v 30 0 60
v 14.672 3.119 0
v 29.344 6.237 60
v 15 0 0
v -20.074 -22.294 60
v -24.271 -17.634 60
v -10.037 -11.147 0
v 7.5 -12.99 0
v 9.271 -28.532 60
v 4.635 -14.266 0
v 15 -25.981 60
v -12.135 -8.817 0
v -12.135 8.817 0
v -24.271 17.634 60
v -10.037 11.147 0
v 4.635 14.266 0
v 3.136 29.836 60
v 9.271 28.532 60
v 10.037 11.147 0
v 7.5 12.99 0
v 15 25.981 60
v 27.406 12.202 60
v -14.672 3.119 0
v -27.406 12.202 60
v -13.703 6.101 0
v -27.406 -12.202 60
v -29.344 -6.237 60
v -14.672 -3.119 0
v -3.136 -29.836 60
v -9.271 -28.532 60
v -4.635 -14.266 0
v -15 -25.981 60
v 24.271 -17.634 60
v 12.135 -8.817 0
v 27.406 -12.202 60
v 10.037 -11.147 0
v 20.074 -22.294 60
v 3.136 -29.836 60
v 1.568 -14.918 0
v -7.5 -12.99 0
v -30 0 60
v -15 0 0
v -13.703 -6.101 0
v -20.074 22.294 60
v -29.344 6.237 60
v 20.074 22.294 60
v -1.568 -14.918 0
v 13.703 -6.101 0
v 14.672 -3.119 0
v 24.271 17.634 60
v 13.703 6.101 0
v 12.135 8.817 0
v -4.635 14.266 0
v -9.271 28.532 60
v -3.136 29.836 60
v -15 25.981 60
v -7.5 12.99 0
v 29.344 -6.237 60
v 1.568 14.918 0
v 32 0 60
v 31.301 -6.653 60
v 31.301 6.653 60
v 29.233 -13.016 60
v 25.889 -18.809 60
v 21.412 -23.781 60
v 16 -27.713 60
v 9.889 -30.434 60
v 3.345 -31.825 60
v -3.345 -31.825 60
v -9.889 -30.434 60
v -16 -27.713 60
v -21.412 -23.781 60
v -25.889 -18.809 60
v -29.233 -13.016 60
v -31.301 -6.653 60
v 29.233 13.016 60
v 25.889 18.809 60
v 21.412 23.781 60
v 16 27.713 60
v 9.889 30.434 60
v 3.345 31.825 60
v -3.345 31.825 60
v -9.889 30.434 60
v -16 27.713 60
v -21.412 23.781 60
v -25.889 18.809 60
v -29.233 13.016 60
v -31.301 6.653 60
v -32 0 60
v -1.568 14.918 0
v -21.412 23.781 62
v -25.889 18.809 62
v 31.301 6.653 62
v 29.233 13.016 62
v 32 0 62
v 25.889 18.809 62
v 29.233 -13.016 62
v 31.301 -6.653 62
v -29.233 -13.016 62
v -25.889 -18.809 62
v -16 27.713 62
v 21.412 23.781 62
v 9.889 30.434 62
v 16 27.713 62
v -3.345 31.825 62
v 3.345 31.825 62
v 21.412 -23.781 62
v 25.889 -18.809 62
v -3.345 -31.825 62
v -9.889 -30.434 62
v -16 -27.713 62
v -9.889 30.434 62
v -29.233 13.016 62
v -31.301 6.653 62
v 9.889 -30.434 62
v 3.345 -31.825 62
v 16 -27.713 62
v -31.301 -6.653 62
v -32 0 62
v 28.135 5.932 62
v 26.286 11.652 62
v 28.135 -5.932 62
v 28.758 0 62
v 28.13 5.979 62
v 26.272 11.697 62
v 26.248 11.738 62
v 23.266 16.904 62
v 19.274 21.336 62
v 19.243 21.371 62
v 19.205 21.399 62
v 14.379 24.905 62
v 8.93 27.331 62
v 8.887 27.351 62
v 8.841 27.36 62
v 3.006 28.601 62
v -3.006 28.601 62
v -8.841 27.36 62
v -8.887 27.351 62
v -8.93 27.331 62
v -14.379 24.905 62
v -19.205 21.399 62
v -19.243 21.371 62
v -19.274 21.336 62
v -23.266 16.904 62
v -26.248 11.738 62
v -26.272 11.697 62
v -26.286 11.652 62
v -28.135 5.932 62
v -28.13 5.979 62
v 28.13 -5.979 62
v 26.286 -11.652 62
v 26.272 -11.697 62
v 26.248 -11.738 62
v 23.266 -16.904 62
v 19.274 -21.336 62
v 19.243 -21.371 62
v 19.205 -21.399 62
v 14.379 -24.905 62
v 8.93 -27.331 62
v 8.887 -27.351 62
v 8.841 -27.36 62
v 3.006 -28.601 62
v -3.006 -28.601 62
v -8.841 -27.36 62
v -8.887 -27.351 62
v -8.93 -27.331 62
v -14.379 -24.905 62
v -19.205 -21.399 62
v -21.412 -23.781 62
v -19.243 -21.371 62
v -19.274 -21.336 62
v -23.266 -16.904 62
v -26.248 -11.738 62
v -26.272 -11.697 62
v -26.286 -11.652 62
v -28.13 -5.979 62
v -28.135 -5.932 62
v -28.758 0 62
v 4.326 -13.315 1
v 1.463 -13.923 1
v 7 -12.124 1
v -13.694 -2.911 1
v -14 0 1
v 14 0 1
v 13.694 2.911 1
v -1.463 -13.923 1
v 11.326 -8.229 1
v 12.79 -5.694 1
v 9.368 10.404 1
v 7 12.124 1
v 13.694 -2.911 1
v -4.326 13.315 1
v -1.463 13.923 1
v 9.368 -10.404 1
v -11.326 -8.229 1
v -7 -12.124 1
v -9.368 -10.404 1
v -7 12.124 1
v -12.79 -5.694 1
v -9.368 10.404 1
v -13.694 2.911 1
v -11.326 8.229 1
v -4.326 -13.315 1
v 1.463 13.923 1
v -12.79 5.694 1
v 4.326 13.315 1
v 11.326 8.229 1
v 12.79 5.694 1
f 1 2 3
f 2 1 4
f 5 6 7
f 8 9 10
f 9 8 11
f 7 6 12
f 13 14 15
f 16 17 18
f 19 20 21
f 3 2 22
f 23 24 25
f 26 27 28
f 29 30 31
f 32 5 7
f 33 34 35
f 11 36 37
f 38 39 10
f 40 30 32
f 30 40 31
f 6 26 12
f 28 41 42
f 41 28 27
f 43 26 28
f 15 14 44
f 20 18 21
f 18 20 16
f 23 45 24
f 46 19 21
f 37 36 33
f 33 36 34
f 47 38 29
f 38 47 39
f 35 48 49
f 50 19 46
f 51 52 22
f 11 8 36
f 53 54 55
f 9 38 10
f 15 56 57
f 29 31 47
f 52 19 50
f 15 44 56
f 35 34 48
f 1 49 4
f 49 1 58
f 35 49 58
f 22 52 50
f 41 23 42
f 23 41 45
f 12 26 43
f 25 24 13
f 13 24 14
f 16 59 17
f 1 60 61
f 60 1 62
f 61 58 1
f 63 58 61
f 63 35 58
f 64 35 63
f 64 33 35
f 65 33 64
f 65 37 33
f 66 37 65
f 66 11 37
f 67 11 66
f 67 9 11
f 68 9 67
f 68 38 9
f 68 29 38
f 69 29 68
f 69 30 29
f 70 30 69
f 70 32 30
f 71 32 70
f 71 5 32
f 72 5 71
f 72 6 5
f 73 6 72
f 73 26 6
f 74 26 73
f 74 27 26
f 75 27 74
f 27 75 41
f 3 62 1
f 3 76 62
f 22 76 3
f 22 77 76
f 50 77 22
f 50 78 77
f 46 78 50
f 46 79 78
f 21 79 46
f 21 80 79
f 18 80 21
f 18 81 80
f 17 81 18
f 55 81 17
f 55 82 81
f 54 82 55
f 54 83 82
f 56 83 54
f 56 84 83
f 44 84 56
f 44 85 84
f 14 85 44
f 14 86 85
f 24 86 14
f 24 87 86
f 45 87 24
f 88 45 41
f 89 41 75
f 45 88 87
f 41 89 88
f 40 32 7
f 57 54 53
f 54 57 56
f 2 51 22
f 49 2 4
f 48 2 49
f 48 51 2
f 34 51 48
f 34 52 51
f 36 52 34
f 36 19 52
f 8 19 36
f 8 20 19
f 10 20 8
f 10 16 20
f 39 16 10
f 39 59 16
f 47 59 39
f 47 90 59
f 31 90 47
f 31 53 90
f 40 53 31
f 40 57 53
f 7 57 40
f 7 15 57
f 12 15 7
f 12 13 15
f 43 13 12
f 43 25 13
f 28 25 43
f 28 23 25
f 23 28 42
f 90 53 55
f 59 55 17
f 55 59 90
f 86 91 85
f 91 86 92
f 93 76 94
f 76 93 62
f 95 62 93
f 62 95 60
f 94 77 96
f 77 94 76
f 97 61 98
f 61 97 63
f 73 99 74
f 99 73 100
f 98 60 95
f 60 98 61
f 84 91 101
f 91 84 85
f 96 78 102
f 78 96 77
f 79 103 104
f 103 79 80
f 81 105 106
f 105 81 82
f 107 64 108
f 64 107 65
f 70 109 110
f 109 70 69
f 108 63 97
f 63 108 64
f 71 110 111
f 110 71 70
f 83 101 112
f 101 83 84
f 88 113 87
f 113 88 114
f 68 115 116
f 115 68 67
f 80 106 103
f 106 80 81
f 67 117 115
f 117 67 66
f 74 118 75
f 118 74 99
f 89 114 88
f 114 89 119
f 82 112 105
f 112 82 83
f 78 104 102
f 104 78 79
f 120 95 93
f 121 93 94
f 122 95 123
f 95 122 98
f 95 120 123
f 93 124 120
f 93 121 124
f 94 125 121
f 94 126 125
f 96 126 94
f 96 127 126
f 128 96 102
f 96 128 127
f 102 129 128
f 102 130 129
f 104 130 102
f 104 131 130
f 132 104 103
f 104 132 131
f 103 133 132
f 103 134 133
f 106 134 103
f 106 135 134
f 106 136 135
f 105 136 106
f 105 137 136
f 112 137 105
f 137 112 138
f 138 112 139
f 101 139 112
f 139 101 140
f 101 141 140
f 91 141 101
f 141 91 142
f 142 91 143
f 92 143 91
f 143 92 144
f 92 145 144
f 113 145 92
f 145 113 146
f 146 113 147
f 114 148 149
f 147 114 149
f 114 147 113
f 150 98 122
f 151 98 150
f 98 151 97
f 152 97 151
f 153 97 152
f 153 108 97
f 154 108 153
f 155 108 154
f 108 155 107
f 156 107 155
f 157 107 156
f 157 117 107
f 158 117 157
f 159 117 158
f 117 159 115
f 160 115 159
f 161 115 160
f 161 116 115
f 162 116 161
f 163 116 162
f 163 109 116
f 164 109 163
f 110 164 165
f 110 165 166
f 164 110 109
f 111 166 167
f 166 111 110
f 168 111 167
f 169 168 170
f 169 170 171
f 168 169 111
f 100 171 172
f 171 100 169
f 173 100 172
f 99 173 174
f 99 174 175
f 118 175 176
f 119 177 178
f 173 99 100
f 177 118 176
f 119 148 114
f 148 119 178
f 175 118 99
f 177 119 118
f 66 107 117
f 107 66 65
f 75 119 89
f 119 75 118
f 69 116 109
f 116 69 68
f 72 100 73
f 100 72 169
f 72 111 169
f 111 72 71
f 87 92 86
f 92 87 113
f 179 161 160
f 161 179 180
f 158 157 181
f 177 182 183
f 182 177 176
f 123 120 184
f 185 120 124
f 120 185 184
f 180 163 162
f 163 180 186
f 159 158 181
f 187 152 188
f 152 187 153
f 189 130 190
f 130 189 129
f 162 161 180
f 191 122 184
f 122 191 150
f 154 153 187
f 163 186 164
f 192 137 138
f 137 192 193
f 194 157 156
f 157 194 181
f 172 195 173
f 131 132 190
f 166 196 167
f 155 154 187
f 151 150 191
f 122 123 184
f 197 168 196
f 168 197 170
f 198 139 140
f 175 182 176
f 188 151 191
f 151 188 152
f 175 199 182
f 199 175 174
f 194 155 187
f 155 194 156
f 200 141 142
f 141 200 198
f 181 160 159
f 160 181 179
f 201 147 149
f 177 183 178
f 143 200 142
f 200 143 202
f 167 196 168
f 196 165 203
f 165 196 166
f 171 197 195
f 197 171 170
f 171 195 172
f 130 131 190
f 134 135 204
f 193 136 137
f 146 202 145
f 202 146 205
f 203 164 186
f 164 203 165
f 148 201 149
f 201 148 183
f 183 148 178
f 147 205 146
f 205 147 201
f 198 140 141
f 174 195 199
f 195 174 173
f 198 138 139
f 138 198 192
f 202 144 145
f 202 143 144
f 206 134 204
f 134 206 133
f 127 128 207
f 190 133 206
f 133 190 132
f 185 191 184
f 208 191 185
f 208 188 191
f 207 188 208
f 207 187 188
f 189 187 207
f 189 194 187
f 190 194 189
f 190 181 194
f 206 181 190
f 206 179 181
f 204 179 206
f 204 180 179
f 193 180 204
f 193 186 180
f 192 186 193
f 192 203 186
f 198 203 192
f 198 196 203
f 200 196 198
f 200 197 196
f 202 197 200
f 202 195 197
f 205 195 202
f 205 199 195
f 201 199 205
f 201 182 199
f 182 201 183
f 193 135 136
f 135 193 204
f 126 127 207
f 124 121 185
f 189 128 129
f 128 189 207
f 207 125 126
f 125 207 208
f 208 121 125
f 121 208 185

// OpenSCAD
module pahar_plastic(inaltime_pahar, raza_baza_pahar, raza_sus_pahar, raza_buza, inaltime_buza, grosime_perete)
{
    difference() {
  
     union(){
   cylinder(h=inaltime_pahar, r1=raza_baza_pahar, r2=raza_sus_pahar); 
        translate([0, 0, inaltime_pahar]) cylinder(h=inaltime_buza, r=raza_buza);
     }
     translate([0, 0, grosime_perete]) cylinder( h=inaltime_pahar+inaltime_buza, r1= raza_baza_pahar- grosime_perete, r2=raza_sus_pahar - grosime_perete);
        
    }
}


pahar_plastic(inaltime_pahar=60, raza_baza_pahar=15, raza_sus_pahar=30, raza_buza=32, inaltime_buza=2, grosime_perete=1);
